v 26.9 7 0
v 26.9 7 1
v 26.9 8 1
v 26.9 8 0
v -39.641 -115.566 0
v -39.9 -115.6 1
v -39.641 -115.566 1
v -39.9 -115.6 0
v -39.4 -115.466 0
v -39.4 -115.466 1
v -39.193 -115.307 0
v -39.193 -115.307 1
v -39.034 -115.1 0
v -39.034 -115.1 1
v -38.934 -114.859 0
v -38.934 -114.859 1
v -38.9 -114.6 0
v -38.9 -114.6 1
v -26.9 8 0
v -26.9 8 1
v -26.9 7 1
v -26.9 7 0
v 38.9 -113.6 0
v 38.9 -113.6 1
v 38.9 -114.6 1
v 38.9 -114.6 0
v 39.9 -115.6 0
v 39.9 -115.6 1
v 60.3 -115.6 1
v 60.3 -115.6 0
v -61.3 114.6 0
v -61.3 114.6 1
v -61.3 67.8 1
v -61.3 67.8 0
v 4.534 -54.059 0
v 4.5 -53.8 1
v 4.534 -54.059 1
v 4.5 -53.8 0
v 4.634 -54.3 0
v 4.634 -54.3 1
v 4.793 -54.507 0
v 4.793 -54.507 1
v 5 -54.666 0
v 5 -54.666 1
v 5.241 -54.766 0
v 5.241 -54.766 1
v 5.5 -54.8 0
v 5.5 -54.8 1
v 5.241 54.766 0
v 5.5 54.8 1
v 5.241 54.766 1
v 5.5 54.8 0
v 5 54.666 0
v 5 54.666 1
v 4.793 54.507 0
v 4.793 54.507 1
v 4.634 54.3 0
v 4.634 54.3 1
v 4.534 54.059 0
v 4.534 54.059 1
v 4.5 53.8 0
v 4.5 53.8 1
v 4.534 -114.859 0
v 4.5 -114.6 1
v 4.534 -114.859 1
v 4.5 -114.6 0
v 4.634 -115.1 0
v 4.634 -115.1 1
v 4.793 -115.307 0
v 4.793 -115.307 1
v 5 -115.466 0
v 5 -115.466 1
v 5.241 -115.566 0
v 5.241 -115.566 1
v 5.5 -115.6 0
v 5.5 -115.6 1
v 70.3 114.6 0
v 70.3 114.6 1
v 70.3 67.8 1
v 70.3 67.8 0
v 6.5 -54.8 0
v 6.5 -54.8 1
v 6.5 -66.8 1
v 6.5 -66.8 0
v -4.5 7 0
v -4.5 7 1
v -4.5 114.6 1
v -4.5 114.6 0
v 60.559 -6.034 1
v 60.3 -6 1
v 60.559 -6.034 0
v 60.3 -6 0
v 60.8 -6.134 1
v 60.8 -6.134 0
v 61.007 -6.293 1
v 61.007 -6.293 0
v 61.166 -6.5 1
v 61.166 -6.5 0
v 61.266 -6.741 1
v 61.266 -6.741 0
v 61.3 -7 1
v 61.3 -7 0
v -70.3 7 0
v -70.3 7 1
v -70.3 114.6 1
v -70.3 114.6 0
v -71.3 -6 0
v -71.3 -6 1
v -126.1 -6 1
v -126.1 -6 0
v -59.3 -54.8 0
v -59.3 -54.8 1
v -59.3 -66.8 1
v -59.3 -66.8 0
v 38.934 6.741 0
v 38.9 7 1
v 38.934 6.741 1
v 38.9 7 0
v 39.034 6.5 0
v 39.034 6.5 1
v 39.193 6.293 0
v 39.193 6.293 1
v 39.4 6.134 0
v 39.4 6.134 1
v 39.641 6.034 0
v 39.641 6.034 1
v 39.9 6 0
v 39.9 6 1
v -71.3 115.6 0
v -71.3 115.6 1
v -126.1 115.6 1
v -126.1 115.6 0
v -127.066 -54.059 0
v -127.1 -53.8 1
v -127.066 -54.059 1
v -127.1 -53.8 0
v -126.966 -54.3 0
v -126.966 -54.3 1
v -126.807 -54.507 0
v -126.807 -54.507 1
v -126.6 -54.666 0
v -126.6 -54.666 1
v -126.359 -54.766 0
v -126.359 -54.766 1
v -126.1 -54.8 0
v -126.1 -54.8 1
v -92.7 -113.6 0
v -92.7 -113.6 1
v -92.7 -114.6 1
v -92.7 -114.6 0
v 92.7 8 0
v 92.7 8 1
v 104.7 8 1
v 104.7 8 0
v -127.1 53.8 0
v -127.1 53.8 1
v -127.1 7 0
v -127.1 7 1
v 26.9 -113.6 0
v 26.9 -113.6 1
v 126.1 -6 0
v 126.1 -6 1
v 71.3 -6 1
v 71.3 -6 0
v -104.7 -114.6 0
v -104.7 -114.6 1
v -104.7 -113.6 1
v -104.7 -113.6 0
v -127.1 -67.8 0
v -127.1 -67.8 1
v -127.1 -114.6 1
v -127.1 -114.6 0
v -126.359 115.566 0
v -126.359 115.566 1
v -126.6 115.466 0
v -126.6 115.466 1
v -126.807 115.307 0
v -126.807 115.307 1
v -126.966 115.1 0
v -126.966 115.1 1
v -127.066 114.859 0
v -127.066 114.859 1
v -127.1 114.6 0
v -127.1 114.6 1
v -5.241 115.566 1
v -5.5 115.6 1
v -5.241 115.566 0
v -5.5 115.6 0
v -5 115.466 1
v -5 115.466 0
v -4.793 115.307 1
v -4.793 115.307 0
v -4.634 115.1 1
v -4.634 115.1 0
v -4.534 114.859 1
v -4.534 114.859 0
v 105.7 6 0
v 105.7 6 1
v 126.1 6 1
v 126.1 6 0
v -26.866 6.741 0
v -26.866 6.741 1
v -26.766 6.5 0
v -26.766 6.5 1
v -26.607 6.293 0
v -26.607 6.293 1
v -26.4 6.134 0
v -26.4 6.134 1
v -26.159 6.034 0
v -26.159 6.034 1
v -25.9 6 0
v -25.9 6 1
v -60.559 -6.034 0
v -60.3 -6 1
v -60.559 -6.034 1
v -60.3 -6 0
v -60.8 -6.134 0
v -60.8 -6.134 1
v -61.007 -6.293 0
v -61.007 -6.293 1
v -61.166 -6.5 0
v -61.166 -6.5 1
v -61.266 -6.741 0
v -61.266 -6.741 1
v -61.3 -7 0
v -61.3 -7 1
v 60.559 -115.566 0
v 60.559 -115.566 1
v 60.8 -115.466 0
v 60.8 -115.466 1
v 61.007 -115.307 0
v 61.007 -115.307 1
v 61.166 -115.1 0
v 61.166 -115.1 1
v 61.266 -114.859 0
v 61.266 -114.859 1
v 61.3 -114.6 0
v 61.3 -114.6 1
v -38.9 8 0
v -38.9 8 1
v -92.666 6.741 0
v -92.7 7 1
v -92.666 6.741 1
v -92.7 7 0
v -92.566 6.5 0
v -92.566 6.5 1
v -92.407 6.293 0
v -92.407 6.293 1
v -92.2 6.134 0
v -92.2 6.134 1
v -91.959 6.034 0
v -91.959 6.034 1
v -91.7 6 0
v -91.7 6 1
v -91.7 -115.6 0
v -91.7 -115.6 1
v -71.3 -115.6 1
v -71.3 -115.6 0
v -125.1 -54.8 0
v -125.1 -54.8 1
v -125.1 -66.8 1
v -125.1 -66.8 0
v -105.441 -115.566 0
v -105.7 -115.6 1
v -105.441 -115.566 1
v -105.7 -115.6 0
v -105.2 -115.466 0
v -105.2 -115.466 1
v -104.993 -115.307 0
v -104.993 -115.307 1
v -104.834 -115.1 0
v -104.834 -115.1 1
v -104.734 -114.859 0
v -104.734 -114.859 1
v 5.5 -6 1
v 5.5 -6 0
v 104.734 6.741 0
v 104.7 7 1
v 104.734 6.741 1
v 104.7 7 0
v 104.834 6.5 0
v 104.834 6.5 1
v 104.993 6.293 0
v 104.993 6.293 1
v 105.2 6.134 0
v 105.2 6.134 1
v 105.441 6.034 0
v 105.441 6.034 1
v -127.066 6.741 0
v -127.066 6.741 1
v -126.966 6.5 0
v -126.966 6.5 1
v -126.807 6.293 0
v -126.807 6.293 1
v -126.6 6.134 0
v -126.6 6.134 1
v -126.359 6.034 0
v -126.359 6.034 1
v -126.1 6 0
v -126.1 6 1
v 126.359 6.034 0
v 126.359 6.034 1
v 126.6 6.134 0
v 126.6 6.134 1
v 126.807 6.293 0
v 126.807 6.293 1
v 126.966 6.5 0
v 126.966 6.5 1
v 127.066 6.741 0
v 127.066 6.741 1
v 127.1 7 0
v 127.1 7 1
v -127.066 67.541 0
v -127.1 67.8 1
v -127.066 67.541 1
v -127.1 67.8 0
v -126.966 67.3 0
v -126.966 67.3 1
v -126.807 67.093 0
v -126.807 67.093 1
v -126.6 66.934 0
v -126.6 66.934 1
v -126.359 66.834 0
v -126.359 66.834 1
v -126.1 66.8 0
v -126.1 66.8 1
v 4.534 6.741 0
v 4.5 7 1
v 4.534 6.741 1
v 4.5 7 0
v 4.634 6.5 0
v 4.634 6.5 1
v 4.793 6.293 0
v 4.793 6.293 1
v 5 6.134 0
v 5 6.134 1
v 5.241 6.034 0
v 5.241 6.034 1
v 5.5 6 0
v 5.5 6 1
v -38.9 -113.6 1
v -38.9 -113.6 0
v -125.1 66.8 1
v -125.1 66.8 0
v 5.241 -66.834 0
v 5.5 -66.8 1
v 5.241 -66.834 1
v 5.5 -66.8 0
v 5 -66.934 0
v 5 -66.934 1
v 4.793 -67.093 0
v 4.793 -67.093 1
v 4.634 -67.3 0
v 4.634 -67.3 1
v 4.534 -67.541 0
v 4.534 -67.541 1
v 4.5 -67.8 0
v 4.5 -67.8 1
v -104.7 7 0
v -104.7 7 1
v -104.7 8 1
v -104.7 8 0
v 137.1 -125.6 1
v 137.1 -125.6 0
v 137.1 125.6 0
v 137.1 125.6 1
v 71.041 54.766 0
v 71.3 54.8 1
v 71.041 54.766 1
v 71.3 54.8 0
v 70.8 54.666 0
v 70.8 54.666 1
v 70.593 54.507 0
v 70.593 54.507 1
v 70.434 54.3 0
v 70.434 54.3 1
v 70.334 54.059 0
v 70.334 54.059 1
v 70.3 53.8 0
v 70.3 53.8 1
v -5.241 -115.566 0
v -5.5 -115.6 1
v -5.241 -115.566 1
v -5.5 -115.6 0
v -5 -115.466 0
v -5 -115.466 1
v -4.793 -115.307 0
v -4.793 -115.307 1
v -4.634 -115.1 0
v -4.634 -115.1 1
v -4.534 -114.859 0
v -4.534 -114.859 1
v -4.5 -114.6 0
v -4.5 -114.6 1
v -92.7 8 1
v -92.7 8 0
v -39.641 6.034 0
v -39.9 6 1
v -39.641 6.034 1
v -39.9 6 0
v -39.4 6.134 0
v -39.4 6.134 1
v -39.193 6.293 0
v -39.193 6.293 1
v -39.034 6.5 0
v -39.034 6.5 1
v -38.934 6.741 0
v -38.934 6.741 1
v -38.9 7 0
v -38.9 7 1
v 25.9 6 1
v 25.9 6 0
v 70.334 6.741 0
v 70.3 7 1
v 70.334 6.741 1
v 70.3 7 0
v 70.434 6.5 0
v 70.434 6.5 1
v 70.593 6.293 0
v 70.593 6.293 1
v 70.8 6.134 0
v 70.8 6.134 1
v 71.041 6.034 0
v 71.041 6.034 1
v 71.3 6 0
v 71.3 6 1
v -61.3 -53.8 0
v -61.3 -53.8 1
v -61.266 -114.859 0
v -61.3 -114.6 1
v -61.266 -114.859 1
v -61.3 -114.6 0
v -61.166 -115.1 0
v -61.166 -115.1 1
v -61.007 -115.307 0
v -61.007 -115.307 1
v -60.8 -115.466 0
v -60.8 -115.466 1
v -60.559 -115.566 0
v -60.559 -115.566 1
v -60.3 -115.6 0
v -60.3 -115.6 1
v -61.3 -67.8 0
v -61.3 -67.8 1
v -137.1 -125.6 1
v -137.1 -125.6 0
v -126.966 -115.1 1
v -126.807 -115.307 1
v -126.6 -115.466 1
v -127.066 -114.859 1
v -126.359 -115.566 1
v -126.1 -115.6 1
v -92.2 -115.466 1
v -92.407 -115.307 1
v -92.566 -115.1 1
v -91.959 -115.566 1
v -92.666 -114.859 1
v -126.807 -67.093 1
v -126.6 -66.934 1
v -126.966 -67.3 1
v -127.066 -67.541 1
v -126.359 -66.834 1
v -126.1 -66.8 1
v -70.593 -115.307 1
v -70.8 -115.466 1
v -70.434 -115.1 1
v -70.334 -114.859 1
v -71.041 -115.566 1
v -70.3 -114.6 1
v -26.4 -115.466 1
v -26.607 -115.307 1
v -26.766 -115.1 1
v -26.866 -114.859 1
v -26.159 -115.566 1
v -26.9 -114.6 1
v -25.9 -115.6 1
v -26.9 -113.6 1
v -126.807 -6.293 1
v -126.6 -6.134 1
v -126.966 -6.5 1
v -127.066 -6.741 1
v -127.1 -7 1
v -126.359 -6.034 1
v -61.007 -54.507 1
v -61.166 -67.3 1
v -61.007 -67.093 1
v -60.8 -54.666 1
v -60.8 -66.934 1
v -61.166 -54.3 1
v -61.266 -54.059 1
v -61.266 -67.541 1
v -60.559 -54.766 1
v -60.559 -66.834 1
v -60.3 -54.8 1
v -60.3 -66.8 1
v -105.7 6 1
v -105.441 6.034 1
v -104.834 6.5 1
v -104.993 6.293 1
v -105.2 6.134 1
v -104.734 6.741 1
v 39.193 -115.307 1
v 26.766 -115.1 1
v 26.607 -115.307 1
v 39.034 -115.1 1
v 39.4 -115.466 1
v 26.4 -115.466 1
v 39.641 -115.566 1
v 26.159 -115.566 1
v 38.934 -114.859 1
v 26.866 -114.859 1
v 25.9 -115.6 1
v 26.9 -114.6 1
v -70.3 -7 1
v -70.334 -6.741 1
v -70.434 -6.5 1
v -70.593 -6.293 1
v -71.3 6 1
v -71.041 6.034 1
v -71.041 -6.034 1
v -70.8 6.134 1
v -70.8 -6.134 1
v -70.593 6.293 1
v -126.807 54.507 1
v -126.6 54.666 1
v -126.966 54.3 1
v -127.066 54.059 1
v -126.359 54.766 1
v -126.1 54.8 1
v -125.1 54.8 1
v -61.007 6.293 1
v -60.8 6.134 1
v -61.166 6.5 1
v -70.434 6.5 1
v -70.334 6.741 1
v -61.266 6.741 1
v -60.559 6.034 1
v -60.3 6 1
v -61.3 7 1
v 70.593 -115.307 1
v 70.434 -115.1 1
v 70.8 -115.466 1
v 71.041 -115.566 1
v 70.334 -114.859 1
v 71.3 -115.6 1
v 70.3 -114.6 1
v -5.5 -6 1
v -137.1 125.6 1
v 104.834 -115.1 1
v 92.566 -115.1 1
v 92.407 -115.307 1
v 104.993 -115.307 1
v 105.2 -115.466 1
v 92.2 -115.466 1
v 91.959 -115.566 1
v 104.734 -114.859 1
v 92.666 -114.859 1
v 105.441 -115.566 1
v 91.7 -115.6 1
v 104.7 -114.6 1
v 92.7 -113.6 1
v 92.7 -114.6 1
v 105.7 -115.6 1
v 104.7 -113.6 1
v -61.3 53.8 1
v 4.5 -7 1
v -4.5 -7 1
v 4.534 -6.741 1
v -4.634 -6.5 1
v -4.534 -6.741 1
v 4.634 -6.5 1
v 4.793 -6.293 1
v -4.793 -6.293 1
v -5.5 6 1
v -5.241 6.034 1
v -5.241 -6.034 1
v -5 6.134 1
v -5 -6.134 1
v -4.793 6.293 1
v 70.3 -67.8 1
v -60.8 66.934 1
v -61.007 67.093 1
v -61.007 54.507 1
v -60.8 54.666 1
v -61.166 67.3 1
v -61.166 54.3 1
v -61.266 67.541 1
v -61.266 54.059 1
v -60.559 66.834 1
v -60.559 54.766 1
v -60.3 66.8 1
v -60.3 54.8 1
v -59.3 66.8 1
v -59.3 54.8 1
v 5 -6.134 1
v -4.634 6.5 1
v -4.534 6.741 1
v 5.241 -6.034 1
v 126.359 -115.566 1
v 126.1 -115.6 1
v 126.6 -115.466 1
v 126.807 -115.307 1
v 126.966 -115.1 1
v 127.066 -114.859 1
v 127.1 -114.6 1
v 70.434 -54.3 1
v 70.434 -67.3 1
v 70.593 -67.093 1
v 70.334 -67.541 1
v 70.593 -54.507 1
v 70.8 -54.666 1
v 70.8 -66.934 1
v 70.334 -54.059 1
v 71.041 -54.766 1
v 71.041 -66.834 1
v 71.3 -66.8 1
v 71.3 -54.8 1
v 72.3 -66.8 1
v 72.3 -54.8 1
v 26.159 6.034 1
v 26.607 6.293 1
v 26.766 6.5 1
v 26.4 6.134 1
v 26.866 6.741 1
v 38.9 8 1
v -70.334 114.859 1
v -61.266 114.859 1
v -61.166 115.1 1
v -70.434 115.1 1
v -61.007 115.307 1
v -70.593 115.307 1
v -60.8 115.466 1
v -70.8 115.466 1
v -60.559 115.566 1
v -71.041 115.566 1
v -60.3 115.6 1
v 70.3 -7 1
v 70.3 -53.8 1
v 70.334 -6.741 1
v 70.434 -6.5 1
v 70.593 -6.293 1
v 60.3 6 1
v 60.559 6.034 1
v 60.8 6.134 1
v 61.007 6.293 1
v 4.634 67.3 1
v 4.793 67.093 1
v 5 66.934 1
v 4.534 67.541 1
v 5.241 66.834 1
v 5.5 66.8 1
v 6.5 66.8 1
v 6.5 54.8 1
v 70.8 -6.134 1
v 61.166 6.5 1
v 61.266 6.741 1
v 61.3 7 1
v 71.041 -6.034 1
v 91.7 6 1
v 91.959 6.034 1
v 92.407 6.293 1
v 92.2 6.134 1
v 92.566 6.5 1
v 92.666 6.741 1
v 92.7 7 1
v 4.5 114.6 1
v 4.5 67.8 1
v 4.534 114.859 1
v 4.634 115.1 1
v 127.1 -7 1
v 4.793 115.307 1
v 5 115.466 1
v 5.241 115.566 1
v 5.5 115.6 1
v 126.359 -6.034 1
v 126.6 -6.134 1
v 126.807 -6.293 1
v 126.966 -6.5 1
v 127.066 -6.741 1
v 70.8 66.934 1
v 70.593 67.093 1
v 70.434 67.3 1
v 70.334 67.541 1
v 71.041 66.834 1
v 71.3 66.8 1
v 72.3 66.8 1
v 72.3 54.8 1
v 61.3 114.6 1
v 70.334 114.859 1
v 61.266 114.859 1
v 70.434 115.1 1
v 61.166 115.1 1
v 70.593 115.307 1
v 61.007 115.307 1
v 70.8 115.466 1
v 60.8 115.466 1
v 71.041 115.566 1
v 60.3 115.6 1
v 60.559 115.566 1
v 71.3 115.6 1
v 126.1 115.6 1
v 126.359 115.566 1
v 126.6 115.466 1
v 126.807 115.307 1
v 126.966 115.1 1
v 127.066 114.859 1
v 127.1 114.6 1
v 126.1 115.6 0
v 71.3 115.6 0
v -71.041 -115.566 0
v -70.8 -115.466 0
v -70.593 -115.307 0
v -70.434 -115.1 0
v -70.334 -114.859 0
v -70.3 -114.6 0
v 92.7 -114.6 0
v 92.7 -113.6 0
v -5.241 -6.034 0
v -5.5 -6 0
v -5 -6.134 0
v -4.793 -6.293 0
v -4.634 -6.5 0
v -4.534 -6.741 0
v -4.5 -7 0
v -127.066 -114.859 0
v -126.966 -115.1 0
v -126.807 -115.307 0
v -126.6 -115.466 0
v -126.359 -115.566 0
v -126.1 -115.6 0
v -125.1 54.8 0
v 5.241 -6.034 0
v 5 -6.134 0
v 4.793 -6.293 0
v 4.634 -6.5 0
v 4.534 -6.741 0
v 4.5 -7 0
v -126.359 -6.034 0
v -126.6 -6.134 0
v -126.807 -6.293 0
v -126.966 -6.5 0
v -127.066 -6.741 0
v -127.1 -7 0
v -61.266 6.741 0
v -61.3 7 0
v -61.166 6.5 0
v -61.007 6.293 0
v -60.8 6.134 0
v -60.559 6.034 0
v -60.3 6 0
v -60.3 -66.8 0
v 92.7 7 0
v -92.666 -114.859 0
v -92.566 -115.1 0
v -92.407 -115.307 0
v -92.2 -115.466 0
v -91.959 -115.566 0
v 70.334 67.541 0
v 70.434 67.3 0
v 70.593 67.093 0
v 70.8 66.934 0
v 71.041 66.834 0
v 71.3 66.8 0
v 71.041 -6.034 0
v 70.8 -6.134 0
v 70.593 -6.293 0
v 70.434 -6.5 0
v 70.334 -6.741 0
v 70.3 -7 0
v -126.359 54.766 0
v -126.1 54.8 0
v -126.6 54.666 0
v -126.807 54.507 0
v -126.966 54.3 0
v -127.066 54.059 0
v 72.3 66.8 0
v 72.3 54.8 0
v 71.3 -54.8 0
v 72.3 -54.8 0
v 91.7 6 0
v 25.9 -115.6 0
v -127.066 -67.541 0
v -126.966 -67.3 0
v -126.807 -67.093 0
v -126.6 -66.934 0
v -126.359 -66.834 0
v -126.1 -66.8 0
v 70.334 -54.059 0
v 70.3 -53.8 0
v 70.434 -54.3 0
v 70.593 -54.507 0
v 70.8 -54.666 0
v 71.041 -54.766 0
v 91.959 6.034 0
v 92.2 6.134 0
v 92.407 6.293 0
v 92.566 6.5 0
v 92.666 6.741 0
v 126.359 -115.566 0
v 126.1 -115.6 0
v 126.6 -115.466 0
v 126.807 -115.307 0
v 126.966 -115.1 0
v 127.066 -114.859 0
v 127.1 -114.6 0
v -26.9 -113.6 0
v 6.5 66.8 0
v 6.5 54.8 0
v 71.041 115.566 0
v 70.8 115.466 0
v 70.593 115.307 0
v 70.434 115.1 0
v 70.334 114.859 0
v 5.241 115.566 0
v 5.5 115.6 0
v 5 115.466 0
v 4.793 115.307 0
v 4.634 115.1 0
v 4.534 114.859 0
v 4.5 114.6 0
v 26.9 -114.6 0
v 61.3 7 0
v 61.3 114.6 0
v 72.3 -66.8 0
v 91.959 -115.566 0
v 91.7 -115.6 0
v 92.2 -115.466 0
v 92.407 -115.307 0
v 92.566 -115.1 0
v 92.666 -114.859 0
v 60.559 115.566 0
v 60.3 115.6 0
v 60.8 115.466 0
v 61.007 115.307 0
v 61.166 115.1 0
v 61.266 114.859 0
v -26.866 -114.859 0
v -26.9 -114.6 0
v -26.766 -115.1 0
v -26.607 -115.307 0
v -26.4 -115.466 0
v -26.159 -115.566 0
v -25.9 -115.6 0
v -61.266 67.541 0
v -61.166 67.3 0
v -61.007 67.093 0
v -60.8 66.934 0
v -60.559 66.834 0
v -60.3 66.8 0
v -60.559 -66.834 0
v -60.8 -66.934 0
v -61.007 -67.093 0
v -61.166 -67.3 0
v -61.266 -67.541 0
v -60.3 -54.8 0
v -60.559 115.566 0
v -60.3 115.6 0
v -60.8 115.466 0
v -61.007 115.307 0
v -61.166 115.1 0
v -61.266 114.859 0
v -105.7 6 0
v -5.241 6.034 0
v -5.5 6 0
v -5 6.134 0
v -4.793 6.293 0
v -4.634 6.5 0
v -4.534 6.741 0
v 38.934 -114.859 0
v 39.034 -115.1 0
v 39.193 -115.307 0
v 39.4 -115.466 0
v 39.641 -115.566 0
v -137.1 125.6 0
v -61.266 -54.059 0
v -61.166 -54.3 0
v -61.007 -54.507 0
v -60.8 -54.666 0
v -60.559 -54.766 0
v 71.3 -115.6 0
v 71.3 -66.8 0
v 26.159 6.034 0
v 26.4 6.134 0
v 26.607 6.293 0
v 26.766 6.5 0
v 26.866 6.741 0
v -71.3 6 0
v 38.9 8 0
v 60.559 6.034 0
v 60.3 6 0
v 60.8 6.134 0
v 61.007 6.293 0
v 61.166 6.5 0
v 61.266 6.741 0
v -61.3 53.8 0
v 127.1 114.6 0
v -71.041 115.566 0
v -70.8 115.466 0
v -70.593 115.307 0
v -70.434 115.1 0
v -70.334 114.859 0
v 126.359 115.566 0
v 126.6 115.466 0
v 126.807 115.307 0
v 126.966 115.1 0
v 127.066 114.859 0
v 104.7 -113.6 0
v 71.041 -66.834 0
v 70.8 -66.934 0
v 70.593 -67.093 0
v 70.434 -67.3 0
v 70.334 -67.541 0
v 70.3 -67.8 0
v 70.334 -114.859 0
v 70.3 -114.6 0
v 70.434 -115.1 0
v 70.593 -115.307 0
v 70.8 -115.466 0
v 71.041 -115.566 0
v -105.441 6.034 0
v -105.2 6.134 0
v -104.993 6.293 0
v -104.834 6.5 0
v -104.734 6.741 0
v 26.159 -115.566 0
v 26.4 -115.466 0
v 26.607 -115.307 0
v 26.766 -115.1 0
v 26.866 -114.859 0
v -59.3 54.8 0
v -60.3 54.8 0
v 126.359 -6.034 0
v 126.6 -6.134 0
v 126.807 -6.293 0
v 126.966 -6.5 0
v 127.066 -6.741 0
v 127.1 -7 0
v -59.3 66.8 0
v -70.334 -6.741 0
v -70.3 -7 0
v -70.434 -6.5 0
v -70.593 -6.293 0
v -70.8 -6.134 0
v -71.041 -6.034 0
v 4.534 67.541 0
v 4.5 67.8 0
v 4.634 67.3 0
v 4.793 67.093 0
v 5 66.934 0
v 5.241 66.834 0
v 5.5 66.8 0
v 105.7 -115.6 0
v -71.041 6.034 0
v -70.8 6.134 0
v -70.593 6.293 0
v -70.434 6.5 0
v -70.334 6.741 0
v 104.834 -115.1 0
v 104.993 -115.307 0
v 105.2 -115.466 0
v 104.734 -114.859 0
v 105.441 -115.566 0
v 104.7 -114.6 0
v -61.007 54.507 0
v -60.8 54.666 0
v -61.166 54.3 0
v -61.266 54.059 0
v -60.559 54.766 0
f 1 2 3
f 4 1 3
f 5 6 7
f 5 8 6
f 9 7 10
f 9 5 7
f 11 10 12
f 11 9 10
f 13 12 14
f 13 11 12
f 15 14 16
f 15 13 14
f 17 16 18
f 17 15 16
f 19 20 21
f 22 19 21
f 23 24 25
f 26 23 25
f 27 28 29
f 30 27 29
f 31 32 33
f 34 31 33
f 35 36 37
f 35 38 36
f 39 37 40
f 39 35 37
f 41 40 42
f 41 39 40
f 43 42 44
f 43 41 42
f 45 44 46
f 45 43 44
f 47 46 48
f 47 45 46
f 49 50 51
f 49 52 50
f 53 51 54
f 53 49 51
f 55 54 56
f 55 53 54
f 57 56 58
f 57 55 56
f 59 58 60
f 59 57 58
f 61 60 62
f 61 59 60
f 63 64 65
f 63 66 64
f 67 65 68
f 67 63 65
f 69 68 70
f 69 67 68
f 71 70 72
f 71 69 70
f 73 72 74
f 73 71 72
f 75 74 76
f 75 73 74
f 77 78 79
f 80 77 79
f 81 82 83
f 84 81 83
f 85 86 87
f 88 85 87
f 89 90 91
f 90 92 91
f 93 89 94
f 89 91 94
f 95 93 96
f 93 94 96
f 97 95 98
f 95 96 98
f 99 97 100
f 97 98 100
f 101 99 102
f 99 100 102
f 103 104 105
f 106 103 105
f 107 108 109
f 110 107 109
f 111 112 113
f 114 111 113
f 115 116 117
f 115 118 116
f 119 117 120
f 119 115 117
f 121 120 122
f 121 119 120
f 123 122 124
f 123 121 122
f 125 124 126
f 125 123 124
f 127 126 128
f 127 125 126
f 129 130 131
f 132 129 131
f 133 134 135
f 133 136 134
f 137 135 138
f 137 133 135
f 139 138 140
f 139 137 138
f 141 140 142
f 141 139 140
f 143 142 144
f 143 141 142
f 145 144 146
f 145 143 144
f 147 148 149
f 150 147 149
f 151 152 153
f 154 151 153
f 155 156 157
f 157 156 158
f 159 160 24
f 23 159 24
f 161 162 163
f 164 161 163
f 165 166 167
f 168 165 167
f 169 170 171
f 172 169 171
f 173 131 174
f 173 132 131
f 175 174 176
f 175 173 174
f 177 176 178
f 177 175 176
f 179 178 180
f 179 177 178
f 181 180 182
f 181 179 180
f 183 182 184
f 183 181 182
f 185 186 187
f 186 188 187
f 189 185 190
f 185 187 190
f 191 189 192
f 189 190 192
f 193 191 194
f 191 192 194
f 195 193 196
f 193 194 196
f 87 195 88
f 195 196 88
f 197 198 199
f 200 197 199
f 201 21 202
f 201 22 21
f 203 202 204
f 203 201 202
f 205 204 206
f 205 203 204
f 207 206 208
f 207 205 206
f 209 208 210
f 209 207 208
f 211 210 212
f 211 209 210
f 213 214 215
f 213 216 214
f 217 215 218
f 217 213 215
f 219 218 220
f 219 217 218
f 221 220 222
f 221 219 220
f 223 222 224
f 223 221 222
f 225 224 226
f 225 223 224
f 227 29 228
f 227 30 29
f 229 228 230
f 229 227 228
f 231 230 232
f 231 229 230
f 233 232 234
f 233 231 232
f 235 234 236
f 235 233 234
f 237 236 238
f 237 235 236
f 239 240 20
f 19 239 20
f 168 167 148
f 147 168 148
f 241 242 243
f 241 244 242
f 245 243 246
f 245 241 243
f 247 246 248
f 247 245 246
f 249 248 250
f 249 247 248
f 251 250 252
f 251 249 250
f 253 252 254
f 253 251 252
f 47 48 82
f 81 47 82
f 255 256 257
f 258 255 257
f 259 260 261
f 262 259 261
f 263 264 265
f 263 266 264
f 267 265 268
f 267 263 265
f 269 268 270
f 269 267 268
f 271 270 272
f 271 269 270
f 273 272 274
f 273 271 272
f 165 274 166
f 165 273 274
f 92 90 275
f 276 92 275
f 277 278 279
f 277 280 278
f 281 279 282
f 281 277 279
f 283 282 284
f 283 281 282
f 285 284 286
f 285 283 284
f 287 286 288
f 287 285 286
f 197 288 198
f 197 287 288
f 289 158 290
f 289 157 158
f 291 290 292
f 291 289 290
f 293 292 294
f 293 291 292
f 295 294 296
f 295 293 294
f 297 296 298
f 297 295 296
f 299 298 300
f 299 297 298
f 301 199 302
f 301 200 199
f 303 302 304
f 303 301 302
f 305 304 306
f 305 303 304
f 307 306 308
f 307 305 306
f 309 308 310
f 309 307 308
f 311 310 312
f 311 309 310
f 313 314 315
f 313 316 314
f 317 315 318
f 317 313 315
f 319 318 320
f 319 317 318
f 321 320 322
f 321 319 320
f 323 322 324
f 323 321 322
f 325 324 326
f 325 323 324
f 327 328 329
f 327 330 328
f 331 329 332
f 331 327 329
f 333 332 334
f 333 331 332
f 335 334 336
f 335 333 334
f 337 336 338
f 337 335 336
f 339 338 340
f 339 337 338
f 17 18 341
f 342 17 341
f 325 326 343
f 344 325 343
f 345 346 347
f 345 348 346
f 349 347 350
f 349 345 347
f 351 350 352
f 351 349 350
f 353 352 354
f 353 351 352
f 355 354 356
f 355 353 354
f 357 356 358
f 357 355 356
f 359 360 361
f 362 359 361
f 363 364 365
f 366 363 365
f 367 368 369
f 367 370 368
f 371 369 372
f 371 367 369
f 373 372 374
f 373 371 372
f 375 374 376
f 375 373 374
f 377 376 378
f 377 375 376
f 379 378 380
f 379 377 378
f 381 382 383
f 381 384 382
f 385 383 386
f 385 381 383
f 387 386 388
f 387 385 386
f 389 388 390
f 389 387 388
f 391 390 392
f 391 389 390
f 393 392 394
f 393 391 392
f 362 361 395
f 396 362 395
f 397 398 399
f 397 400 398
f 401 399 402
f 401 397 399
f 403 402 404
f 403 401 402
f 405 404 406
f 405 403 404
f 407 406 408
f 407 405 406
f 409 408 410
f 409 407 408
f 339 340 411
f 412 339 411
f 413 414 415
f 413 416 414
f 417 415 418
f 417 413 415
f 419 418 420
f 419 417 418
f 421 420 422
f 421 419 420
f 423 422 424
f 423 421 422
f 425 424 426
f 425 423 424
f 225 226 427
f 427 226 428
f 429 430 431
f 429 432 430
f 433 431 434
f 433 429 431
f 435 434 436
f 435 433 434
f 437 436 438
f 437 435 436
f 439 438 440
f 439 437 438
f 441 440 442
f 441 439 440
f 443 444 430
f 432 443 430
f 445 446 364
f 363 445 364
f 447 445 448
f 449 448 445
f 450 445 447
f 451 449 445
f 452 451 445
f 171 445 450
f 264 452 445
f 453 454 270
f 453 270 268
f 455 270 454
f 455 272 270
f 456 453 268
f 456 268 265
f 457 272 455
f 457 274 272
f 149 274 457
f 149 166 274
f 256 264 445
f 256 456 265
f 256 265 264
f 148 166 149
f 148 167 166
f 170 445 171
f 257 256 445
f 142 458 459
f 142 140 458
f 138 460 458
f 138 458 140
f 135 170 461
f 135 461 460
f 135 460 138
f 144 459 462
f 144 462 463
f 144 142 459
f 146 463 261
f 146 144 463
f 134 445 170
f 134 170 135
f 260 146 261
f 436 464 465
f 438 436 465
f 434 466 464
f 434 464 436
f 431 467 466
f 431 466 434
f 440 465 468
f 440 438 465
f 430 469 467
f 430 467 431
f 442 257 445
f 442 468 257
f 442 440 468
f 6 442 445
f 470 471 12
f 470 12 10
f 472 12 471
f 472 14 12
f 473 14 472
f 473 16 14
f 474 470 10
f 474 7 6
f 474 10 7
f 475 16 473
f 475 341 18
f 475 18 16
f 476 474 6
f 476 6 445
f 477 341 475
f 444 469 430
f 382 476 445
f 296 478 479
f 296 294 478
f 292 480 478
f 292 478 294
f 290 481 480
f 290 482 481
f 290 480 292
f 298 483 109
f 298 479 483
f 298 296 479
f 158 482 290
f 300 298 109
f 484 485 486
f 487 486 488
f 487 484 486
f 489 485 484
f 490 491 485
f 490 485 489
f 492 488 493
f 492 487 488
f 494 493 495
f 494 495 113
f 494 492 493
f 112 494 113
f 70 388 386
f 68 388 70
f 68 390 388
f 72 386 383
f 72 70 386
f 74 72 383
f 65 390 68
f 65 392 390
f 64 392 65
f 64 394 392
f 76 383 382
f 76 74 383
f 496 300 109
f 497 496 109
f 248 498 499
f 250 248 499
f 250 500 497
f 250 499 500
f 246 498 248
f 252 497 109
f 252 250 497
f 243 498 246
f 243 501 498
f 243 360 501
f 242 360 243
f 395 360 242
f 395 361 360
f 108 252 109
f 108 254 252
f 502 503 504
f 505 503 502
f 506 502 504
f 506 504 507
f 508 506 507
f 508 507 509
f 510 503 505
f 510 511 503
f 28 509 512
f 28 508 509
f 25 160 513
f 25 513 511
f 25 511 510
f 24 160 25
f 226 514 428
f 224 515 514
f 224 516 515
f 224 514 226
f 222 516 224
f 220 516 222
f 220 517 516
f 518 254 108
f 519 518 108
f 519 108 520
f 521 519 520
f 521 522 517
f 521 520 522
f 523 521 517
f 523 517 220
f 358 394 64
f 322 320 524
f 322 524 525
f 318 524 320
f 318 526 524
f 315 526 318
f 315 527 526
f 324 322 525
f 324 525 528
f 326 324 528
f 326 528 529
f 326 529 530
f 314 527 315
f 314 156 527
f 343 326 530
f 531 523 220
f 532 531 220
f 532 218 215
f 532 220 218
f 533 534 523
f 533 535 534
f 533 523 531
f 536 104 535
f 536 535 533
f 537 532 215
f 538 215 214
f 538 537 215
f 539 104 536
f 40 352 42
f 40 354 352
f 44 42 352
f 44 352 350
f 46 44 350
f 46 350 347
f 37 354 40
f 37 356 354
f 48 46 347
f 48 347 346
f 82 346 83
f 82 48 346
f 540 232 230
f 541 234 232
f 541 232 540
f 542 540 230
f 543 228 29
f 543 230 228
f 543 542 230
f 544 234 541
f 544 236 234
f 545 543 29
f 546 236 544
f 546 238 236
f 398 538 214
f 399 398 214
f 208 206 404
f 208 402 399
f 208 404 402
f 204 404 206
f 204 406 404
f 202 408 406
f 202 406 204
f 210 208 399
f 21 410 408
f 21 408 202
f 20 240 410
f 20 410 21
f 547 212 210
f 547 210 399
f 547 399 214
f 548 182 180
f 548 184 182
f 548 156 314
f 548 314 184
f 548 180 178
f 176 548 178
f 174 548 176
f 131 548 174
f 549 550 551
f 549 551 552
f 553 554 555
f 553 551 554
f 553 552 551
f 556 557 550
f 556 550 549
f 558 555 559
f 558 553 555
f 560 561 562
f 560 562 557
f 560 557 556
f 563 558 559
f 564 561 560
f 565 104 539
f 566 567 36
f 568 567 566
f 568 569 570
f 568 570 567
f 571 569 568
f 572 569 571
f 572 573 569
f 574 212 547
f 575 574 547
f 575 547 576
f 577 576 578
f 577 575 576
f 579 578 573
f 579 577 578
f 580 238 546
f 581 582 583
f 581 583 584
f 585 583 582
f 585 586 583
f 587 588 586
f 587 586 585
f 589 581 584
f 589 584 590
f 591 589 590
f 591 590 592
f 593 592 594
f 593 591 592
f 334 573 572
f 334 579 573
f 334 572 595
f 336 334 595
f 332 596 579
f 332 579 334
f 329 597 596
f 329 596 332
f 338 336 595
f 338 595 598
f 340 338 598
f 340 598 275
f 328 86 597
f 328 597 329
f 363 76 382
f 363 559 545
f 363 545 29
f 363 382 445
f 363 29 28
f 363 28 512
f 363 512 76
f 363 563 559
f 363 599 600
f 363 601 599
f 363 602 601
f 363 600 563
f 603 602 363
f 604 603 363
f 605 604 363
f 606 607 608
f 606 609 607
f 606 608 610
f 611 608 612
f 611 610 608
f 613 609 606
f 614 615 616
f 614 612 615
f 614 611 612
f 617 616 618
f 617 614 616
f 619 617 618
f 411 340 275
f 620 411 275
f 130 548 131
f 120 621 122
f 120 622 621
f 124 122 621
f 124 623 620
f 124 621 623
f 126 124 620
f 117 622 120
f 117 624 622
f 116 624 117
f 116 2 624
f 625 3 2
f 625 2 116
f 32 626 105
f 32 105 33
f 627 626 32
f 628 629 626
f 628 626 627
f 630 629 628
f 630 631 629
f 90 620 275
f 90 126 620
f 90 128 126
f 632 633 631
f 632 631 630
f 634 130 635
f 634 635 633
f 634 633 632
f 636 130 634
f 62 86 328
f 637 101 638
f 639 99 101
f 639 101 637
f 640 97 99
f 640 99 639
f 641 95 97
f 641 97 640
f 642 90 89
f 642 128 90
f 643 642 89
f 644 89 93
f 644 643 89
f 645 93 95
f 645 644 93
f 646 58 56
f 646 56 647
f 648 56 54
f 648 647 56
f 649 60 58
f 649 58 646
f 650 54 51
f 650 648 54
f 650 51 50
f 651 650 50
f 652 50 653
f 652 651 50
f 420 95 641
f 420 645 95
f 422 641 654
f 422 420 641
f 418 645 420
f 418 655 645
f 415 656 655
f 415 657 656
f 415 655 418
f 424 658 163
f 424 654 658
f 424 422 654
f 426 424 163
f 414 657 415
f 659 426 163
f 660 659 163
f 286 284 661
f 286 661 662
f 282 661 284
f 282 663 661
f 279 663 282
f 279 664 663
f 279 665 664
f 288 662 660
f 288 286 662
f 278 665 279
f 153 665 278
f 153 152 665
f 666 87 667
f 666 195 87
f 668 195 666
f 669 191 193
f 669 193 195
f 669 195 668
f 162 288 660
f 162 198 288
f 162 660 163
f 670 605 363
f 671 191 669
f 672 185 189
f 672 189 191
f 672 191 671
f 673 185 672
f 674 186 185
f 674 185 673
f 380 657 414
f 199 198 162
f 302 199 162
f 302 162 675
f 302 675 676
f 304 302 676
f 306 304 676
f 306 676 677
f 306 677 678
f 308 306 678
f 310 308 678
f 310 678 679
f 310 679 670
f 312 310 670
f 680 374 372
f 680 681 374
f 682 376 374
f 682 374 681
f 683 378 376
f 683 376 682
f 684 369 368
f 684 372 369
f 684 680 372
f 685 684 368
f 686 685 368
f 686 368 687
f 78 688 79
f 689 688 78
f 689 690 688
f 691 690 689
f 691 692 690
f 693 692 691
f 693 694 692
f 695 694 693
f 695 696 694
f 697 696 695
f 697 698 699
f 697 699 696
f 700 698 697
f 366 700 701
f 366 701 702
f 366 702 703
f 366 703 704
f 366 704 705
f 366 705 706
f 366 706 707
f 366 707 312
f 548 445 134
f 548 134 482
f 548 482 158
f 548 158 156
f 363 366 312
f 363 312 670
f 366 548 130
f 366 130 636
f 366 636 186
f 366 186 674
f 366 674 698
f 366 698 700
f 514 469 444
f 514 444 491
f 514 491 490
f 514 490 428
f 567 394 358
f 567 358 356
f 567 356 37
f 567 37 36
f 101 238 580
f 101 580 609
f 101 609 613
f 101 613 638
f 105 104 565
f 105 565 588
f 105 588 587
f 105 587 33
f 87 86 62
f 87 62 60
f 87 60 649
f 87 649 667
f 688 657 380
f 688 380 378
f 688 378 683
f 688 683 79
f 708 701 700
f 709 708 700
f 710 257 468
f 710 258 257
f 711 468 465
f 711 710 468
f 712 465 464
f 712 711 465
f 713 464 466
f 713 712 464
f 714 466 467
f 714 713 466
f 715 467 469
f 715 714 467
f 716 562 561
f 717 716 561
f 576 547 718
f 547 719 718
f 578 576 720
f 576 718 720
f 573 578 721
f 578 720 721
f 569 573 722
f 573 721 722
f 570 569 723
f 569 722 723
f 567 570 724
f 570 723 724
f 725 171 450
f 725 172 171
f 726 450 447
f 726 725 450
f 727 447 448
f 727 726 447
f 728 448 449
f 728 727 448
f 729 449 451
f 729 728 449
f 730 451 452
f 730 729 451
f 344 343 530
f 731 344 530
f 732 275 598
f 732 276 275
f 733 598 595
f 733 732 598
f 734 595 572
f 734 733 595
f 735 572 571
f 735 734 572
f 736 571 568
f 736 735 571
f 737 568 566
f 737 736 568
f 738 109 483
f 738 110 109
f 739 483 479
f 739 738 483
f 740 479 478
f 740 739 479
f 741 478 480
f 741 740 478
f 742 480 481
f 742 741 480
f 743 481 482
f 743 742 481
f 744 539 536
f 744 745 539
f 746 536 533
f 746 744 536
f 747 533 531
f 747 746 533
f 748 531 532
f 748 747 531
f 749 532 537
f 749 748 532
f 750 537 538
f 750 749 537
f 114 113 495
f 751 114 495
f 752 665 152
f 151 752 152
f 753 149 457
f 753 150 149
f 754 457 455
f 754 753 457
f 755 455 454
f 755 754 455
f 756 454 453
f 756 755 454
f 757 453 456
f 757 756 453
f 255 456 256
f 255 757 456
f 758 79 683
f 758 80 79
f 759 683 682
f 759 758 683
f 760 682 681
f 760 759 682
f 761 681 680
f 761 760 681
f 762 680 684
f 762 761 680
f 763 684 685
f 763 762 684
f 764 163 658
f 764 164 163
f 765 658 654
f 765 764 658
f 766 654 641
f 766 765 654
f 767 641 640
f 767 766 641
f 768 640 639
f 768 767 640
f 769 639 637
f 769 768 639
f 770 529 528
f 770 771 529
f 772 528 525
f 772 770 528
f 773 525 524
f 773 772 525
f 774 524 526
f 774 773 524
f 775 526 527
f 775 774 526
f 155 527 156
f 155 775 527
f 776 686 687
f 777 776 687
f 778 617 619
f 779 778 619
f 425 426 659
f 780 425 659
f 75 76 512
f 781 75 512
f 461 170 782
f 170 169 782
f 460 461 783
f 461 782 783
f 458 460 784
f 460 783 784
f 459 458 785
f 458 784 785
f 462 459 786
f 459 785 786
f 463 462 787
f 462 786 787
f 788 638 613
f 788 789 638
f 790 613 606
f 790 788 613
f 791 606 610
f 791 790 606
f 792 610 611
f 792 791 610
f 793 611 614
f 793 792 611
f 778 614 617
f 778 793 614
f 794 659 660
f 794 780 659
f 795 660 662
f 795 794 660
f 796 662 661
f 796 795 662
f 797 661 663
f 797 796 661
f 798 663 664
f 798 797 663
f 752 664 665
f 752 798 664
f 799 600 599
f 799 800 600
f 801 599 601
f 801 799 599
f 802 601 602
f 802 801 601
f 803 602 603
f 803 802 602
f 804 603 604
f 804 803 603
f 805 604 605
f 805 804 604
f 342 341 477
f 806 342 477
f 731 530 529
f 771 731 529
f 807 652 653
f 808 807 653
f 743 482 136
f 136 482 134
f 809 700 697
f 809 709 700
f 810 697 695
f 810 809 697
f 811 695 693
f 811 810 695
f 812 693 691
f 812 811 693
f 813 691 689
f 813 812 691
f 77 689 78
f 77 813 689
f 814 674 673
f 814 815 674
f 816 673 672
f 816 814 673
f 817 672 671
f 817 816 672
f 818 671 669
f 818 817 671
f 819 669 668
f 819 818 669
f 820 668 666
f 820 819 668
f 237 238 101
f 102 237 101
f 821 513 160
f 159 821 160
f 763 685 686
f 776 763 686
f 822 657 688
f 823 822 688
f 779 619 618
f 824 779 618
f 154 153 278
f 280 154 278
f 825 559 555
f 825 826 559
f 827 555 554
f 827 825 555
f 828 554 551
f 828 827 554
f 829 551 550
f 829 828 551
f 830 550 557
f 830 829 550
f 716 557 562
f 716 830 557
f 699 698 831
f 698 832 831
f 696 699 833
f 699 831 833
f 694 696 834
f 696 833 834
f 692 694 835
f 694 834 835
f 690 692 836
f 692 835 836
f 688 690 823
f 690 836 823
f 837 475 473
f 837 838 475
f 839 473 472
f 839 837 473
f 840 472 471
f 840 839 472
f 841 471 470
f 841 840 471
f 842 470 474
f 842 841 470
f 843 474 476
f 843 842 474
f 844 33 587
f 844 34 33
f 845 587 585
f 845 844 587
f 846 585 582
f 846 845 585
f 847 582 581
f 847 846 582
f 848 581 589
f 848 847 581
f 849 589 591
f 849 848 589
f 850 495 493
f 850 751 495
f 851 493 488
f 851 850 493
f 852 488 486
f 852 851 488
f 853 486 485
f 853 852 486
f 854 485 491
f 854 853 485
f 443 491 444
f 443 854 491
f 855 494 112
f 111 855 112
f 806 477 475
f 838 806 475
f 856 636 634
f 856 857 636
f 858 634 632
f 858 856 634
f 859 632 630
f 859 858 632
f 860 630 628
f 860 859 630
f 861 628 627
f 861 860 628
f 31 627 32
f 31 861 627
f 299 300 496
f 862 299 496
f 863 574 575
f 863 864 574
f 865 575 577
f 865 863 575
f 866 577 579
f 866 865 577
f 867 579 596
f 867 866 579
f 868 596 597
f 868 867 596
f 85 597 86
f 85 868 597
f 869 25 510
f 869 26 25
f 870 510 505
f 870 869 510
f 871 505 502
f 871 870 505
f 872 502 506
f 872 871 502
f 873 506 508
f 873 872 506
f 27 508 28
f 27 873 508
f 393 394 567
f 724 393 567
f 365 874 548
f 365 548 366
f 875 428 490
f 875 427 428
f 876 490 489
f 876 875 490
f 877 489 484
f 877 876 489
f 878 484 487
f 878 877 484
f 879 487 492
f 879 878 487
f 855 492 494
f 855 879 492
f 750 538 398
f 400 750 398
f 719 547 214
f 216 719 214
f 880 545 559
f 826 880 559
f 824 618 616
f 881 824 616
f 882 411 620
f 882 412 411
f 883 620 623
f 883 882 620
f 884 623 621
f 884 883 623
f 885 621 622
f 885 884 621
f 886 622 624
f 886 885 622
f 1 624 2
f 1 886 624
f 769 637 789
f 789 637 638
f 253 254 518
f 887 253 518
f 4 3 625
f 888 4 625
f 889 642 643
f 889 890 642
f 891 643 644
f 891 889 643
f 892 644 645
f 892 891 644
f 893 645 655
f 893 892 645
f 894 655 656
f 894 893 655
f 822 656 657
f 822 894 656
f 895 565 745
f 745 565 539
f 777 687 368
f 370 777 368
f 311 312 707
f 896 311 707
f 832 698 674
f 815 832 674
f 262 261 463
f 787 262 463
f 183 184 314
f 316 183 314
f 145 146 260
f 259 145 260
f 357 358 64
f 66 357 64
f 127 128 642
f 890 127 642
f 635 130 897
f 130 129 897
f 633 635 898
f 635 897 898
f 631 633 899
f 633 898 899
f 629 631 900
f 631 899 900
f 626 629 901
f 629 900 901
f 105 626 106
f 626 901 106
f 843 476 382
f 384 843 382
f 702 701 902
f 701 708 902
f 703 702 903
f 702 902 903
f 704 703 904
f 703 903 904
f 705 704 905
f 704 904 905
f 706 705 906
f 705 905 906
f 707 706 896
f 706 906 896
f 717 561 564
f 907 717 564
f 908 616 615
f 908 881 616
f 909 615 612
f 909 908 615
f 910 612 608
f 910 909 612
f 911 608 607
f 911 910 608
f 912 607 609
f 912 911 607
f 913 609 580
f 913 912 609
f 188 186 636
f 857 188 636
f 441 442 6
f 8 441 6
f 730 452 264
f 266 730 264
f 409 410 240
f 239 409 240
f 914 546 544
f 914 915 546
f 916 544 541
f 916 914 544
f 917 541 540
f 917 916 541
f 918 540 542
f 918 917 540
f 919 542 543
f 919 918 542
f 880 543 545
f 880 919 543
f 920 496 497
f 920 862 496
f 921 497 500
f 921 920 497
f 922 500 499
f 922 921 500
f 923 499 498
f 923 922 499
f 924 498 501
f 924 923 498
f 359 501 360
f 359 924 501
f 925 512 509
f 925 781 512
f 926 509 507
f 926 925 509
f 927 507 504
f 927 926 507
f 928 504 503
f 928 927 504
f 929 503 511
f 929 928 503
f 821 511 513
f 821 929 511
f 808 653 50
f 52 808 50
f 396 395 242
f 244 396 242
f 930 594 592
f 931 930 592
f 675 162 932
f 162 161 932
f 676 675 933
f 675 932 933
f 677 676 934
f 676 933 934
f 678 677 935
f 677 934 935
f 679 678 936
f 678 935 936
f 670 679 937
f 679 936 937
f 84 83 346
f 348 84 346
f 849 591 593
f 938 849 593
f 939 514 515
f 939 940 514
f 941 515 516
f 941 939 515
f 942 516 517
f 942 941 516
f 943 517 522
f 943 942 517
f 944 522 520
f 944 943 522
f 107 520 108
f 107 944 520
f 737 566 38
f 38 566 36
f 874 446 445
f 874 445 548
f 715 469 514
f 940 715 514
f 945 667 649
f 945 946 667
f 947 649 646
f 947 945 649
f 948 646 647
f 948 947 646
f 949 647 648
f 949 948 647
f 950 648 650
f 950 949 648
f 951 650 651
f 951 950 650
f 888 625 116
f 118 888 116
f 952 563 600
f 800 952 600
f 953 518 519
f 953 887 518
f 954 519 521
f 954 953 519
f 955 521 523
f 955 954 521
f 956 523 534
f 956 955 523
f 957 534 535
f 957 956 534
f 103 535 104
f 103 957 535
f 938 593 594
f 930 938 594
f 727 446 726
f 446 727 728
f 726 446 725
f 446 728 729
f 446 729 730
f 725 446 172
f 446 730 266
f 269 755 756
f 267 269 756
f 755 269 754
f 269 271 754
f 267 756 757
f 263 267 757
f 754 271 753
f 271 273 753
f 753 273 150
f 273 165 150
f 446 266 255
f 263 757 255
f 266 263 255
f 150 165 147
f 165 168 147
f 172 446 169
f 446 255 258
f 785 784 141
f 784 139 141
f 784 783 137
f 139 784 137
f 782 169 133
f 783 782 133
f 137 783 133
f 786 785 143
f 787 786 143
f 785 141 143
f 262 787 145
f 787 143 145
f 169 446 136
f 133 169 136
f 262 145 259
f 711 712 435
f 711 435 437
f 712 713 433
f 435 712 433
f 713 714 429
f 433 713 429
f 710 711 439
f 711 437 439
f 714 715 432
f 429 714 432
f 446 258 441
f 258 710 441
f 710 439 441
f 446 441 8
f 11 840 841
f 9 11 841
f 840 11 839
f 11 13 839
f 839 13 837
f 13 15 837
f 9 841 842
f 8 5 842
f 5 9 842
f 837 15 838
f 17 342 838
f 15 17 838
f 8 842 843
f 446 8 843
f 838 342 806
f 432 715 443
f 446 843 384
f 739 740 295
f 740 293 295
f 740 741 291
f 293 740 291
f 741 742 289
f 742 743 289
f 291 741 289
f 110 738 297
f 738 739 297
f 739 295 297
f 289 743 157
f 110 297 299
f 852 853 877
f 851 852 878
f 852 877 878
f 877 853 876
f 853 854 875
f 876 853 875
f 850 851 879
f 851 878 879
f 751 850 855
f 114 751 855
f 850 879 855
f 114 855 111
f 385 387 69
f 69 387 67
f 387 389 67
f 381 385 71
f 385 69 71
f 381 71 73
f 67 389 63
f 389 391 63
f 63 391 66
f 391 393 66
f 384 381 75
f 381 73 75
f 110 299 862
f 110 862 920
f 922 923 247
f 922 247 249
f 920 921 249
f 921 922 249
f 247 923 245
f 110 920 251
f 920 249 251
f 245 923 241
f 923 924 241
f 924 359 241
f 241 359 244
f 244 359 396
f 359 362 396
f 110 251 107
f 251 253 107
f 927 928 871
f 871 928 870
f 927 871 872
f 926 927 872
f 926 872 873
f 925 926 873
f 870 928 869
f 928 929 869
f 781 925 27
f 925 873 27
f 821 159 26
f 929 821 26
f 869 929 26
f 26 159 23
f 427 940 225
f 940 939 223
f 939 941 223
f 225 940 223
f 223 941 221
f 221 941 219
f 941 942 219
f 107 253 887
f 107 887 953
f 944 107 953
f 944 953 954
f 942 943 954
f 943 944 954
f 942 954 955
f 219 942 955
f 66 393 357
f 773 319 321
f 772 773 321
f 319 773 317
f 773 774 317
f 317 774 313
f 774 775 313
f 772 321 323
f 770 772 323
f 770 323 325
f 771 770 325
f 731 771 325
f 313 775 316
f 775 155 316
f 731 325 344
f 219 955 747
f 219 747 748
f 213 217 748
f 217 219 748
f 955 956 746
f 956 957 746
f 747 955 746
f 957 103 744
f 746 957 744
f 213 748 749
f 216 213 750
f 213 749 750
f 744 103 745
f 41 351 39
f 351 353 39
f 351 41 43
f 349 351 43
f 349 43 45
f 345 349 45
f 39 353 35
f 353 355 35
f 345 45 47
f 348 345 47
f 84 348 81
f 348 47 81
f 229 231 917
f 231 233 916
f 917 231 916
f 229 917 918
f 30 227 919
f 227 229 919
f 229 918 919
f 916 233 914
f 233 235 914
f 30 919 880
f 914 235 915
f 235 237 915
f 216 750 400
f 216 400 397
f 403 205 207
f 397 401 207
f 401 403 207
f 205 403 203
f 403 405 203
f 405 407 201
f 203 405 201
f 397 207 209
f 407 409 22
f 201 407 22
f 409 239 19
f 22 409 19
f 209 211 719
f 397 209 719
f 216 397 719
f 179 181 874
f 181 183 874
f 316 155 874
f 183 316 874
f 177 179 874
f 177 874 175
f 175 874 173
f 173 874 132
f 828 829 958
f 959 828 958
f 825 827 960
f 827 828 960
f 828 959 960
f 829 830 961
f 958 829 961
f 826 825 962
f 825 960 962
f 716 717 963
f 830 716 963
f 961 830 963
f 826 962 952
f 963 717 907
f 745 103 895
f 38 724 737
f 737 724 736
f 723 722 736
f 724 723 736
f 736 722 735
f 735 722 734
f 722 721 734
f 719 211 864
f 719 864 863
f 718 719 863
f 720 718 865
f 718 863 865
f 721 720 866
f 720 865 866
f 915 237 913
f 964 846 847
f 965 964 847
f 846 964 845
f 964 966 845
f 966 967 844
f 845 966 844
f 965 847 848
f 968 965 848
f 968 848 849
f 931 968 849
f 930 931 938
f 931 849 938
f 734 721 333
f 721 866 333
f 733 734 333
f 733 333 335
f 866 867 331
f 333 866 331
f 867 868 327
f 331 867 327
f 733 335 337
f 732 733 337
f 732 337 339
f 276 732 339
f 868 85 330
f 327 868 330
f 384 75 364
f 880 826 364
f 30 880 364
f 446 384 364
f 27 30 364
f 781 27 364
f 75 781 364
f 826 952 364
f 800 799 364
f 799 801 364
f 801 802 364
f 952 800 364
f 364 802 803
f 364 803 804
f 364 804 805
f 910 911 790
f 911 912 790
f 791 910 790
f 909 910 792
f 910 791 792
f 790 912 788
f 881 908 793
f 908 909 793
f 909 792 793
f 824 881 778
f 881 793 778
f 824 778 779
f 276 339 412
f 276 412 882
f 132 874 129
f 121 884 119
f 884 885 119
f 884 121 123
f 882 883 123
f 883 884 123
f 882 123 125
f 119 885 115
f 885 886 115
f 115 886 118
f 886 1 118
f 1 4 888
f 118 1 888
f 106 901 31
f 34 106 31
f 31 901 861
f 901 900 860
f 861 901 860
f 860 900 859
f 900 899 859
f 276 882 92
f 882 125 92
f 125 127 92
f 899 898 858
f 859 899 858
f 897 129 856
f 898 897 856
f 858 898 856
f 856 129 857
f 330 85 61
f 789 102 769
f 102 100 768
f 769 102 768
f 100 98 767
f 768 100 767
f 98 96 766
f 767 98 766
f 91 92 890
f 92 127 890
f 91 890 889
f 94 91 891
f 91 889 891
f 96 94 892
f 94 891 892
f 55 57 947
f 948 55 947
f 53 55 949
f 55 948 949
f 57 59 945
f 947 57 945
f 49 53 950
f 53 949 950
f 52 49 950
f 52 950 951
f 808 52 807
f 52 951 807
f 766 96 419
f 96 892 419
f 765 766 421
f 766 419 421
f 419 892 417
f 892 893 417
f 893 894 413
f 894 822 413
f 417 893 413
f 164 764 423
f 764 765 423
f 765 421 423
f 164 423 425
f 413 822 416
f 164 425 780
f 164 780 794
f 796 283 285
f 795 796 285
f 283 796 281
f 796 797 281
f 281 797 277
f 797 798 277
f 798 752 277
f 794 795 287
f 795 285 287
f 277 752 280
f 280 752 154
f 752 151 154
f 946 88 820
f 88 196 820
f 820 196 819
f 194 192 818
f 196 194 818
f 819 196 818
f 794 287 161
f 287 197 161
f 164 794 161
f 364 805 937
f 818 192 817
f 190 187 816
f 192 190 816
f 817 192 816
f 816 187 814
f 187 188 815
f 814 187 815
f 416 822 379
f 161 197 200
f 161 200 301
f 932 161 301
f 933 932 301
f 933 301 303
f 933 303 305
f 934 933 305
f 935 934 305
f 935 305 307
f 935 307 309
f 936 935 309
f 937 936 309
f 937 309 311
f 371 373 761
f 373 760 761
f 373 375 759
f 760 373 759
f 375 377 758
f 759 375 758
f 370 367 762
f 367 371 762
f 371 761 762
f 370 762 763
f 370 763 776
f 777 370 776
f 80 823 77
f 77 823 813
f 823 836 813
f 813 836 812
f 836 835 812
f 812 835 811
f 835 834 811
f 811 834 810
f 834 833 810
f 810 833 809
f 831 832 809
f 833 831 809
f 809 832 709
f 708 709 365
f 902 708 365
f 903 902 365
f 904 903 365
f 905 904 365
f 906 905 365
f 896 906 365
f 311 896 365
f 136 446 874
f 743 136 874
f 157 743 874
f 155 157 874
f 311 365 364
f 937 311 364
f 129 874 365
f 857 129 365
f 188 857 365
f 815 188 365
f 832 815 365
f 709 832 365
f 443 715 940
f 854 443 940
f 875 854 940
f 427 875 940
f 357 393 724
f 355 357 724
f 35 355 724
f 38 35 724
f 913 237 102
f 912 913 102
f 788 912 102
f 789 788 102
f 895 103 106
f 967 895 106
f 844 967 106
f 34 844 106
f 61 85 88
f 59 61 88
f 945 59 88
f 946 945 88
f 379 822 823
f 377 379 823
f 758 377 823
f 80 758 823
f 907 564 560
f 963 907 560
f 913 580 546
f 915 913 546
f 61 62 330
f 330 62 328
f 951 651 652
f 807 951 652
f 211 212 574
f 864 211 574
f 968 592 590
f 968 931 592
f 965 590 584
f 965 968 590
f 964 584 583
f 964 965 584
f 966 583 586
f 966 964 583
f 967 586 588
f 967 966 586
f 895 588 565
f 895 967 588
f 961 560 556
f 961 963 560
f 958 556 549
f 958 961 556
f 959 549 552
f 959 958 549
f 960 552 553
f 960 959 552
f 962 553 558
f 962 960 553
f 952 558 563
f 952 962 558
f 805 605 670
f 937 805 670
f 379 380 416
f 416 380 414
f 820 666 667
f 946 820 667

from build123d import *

# Parameters (mm, degrees)
F0_W     = 274.2
F0_H     = 251.2
F1_DEPTH = 1
F3_DEPTH = 1.001
F4_R     = 1


with BuildPart() as f1:
    # F0 (on Top) → F1 (new body)
    with BuildSketch(Plane.XY):
        Rectangle(F0_W, F0_H)
    extrude(amount=F1_DEPTH)

    # F2 (on face) → F3 (cut, through all)
    with BuildSketch(Plane.XY.offset(1)):
        Polygon((-127.1, -66.8), (-127.1, -115.6), (-104.7, -115.6), (-104.7, -113.6), (-92.7, -113.6), (-92.7, -115.6), (-70.3, -115.6), (-70.3, -6), (-127.1, -6), (-127.1, -54.8), (-125.1, -54.8), (-125.1, -66.8), align=None)
        Polygon((-4.5, -6), (-61.3, -6), (-61.3, -54.8), (-59.3, -54.8), (-59.3, -66.8), (-61.3, -66.8), (-61.3, -115.6), (-38.9, -115.6), (-38.9, -113.6), (-26.9, -113.6), (-26.9, -115.6), (-4.5, -115.6), align=None)
        Polygon((61.3, -6), (4.5, -6), (4.5, -54.8), (6.5, -54.8), (6.5, -66.8), (4.5, -66.8), (4.5, -115.6), (26.9, -115.6), (26.9, -113.6), (38.9, -113.6), (38.9, -115.6), (61.3, -115.6), align=None)
        Polygon((127.1, -6), (70.3, -6), (70.3, -54.8), (72.3, -54.8), (72.3, -66.8), (70.3, -66.8), (70.3, -115.6), (92.7, -115.6), (92.7, -113.6), (104.7, -113.6), (104.7, -115.6), (127.1, -115.6), align=None)
        Polygon((127.1, 115.6), (70.3, 115.6), (70.3, 66.8), (72.3, 66.8), (72.3, 54.8), (70.3, 54.8), (70.3, 6), (92.7, 6), (92.7, 8), (104.7, 8), (104.7, 6), (127.1, 6), align=None)
        Polygon((61.3, 115.6), (4.5, 115.6), (4.5, 66.8), (6.5, 66.8), (6.5, 54.8), (4.5, 54.8), (4.5, 6), (26.9, 6), (26.9, 8), (38.9, 8), (38.9, 6), (61.3, 6), align=None)
        Polygon((-4.5, 115.6), (-61.3, 115.6), (-61.3, 66.8), (-59.3, 66.8), (-59.3, 54.8), (-61.3, 54.8), (-61.3, 6), (-38.9, 6), (-38.9, 8), (-26.9, 8), (-26.9, 6), (-4.5, 6), align=None)
        Polygon((-70.3, 115.6), (-127.1, 115.6), (-127.1, 66.8), (-125.1, 66.8), (-125.1, 54.8), (-127.1, 54.8), (-127.1, 6), (-104.7, 6), (-104.7, 8), (-92.7, 8), (-92.7, 6), (-70.3, 6), align=None)
    extrude(amount=-F3_DEPTH, mode=Mode.SUBTRACT)

    # F4
    f4_edges = [f1.edges().sort_by_distance(p)[0] for p in [
        (-127.1, -115.6, 0.5),
        (-104.7, -115.6, 0.5),
        (-92.7, -115.6, 0.5),
        (-70.3, -115.6, 0.5),
        (-70.3, -6, 0.5),
        (-127.1, -6, 0.5),
        (-127.1, -54.8, 0.5),
        (-127.1, -66.8, 0.5),
        (-61.3, -6, 0.5),
        (-4.5, -6, 0.5),
        (-61.3, -54.8, 0.5),
        (-61.3, -66.8, 0.5),
        (-61.3, -115.6, 0.5),
        (-38.9, -115.6, 0.5),
        (-26.9, -115.6, 0.5),
        (-4.5, -115.6, 0.5),
        (4.5, -115.6, 0.5),
        (26.9, -115.6, 0.5),
        (38.9, -115.6, 0.5),
        (61.3, -115.6, 0.5),
        (61.3, -6, 0.5),
        (4.5, -6, 0.5),
        (4.5, -54.8, 0.5),
        (4.5, -66.8, 0.5),
        (70.3, -6, 0.5),
        (70.3, -54.8, 0.5),
        (70.3, -66.8, 0.5),
        (70.3, -115.6, 0.5),
        (92.7, -115.6, 0.5),
        (104.7, -115.6, 0.5),
        (127.1, -115.6, 0.5),
        (127.1, -6, 0.5),
        (-127.1, 6, 0.5),
        (-104.7, 6, 0.5),
        (-92.7, 6, 0.5),
        (-70.3, 6, 0.5),
        (-70.3, 115.6, 0.5),
        (-127.1, 115.6, 0.5),
        (-127.1, 66.8, 0.5),
        (-127.1, 54.8, 0.5),
        (-61.3, 115.6, 0.5),
        (-61.3, 66.8, 0.5),
        (-61.3, 54.8, 0.5),
        (-61.3, 6, 0.5),
        (-38.9, 6, 0.5),
        (-26.9, 6, 0.5),
        (-4.5, 6, 0.5),
        (-4.5, 115.6, 0.5),
        (4.5, 115.6, 0.5),
        (4.5, 66.8, 0.5),
        (4.5, 54.8, 0.5),
        (4.5, 6, 0.5),
        (26.9, 6, 0.5),
        (38.9, 6, 0.5),
        (61.3, 6, 0.5),
        (61.3, 115.6, 0.5),
        (70.3, 115.6, 0.5),
        (70.3, 66.8, 0.5),
        (70.3, 54.8, 0.5),
        (70.3, 6, 0.5),
        (92.7, 6, 0.5),
        (104.7, 6, 0.5),
        (127.1, 6, 0.5),
        (127.1, 115.6, 0.5),
    ]]
    fillet(f4_edges, radius=F4_R)


solid = f1.part
